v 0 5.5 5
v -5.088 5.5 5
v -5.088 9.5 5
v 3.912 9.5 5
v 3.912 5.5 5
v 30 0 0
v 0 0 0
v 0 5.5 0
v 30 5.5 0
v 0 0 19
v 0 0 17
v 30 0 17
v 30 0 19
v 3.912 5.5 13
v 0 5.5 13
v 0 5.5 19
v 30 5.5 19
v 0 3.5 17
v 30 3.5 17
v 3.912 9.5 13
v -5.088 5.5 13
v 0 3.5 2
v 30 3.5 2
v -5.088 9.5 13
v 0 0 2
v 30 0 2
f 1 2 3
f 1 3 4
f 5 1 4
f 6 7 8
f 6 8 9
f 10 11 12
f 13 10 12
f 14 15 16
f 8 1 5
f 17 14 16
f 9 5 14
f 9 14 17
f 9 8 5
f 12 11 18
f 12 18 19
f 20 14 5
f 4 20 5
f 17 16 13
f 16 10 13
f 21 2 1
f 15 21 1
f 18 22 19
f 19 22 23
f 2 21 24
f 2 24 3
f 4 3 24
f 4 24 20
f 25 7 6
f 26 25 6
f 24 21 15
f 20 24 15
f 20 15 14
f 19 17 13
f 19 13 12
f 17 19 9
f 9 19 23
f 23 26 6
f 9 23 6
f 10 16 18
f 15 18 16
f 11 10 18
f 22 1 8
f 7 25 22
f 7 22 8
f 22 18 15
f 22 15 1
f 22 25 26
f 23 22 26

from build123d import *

# Parameters (mm, degrees)
SKETCH1_W             = 30
SKETCH1_H             = 2
BOSS_EXTRUDE1_DEPTH   = 3.5
BOSS_EXTRUDE1_2_DEPTH = 3.5
SKETCH2_W             = 30
SKETCH2_H             = 19
BOSS_EXTRUDE2_DEPTH   = 2
SKETCH3_W             = 9
SKETCH3_H             = 8
BOSS_EXTRUDE3_DEPTH   = 4


with BuildPart() as part:
    # Sketch1 → Boss-Extrude1 (new body)
    with BuildSketch(Plane(origin=(0, 0, 0), x_dir=(1, 0, 0), z_dir=(0, 1, 0))):
        with Locations((15, -1)):
            Rectangle(SKETCH1_W, SKETCH1_H)
    extrude(amount=BOSS_EXTRUDE1_DEPTH)



with BuildPart() as body_2:
    # Sketch1 → Boss-Extrude1 2 (new body)
    with BuildSketch(Plane(origin=(0, 0, 0), x_dir=(1, 0, 0), z_dir=(0, 1, 0))):
        with Locations((15, -18)):
            Rectangle(SKETCH1_W, SKETCH1_H)
    extrude(amount=BOSS_EXTRUDE1_2_DEPTH)


with BuildPart() as part_1:
    add(part.part)

    add(body_2.part)  # Boss-Extrude2 merges body 2
    # Sketch2 → Boss-Extrude2 (add)
    with BuildSketch(Plane(origin=(0, 3.5, 0), x_dir=(1, 0, 0), z_dir=(0, 1, 0))):
        with Locations((15, -9.5)):
            Rectangle(SKETCH2_W, SKETCH2_H)
    extrude(amount=BOSS_EXTRUDE2_DEPTH)

    # Sketch3 → Boss-Extrude3 (add)
    with BuildSketch(Plane(origin=(0, 5.5, 0), x_dir=(1, 0, 0), z_dir=(0, 1, 0))):
        with Locations((-0.587922654, -9)):
            Rectangle(SKETCH3_W, SKETCH3_H)
    extrude(amount=BOSS_EXTRUDE3_DEPTH)


solid = part_1.part
